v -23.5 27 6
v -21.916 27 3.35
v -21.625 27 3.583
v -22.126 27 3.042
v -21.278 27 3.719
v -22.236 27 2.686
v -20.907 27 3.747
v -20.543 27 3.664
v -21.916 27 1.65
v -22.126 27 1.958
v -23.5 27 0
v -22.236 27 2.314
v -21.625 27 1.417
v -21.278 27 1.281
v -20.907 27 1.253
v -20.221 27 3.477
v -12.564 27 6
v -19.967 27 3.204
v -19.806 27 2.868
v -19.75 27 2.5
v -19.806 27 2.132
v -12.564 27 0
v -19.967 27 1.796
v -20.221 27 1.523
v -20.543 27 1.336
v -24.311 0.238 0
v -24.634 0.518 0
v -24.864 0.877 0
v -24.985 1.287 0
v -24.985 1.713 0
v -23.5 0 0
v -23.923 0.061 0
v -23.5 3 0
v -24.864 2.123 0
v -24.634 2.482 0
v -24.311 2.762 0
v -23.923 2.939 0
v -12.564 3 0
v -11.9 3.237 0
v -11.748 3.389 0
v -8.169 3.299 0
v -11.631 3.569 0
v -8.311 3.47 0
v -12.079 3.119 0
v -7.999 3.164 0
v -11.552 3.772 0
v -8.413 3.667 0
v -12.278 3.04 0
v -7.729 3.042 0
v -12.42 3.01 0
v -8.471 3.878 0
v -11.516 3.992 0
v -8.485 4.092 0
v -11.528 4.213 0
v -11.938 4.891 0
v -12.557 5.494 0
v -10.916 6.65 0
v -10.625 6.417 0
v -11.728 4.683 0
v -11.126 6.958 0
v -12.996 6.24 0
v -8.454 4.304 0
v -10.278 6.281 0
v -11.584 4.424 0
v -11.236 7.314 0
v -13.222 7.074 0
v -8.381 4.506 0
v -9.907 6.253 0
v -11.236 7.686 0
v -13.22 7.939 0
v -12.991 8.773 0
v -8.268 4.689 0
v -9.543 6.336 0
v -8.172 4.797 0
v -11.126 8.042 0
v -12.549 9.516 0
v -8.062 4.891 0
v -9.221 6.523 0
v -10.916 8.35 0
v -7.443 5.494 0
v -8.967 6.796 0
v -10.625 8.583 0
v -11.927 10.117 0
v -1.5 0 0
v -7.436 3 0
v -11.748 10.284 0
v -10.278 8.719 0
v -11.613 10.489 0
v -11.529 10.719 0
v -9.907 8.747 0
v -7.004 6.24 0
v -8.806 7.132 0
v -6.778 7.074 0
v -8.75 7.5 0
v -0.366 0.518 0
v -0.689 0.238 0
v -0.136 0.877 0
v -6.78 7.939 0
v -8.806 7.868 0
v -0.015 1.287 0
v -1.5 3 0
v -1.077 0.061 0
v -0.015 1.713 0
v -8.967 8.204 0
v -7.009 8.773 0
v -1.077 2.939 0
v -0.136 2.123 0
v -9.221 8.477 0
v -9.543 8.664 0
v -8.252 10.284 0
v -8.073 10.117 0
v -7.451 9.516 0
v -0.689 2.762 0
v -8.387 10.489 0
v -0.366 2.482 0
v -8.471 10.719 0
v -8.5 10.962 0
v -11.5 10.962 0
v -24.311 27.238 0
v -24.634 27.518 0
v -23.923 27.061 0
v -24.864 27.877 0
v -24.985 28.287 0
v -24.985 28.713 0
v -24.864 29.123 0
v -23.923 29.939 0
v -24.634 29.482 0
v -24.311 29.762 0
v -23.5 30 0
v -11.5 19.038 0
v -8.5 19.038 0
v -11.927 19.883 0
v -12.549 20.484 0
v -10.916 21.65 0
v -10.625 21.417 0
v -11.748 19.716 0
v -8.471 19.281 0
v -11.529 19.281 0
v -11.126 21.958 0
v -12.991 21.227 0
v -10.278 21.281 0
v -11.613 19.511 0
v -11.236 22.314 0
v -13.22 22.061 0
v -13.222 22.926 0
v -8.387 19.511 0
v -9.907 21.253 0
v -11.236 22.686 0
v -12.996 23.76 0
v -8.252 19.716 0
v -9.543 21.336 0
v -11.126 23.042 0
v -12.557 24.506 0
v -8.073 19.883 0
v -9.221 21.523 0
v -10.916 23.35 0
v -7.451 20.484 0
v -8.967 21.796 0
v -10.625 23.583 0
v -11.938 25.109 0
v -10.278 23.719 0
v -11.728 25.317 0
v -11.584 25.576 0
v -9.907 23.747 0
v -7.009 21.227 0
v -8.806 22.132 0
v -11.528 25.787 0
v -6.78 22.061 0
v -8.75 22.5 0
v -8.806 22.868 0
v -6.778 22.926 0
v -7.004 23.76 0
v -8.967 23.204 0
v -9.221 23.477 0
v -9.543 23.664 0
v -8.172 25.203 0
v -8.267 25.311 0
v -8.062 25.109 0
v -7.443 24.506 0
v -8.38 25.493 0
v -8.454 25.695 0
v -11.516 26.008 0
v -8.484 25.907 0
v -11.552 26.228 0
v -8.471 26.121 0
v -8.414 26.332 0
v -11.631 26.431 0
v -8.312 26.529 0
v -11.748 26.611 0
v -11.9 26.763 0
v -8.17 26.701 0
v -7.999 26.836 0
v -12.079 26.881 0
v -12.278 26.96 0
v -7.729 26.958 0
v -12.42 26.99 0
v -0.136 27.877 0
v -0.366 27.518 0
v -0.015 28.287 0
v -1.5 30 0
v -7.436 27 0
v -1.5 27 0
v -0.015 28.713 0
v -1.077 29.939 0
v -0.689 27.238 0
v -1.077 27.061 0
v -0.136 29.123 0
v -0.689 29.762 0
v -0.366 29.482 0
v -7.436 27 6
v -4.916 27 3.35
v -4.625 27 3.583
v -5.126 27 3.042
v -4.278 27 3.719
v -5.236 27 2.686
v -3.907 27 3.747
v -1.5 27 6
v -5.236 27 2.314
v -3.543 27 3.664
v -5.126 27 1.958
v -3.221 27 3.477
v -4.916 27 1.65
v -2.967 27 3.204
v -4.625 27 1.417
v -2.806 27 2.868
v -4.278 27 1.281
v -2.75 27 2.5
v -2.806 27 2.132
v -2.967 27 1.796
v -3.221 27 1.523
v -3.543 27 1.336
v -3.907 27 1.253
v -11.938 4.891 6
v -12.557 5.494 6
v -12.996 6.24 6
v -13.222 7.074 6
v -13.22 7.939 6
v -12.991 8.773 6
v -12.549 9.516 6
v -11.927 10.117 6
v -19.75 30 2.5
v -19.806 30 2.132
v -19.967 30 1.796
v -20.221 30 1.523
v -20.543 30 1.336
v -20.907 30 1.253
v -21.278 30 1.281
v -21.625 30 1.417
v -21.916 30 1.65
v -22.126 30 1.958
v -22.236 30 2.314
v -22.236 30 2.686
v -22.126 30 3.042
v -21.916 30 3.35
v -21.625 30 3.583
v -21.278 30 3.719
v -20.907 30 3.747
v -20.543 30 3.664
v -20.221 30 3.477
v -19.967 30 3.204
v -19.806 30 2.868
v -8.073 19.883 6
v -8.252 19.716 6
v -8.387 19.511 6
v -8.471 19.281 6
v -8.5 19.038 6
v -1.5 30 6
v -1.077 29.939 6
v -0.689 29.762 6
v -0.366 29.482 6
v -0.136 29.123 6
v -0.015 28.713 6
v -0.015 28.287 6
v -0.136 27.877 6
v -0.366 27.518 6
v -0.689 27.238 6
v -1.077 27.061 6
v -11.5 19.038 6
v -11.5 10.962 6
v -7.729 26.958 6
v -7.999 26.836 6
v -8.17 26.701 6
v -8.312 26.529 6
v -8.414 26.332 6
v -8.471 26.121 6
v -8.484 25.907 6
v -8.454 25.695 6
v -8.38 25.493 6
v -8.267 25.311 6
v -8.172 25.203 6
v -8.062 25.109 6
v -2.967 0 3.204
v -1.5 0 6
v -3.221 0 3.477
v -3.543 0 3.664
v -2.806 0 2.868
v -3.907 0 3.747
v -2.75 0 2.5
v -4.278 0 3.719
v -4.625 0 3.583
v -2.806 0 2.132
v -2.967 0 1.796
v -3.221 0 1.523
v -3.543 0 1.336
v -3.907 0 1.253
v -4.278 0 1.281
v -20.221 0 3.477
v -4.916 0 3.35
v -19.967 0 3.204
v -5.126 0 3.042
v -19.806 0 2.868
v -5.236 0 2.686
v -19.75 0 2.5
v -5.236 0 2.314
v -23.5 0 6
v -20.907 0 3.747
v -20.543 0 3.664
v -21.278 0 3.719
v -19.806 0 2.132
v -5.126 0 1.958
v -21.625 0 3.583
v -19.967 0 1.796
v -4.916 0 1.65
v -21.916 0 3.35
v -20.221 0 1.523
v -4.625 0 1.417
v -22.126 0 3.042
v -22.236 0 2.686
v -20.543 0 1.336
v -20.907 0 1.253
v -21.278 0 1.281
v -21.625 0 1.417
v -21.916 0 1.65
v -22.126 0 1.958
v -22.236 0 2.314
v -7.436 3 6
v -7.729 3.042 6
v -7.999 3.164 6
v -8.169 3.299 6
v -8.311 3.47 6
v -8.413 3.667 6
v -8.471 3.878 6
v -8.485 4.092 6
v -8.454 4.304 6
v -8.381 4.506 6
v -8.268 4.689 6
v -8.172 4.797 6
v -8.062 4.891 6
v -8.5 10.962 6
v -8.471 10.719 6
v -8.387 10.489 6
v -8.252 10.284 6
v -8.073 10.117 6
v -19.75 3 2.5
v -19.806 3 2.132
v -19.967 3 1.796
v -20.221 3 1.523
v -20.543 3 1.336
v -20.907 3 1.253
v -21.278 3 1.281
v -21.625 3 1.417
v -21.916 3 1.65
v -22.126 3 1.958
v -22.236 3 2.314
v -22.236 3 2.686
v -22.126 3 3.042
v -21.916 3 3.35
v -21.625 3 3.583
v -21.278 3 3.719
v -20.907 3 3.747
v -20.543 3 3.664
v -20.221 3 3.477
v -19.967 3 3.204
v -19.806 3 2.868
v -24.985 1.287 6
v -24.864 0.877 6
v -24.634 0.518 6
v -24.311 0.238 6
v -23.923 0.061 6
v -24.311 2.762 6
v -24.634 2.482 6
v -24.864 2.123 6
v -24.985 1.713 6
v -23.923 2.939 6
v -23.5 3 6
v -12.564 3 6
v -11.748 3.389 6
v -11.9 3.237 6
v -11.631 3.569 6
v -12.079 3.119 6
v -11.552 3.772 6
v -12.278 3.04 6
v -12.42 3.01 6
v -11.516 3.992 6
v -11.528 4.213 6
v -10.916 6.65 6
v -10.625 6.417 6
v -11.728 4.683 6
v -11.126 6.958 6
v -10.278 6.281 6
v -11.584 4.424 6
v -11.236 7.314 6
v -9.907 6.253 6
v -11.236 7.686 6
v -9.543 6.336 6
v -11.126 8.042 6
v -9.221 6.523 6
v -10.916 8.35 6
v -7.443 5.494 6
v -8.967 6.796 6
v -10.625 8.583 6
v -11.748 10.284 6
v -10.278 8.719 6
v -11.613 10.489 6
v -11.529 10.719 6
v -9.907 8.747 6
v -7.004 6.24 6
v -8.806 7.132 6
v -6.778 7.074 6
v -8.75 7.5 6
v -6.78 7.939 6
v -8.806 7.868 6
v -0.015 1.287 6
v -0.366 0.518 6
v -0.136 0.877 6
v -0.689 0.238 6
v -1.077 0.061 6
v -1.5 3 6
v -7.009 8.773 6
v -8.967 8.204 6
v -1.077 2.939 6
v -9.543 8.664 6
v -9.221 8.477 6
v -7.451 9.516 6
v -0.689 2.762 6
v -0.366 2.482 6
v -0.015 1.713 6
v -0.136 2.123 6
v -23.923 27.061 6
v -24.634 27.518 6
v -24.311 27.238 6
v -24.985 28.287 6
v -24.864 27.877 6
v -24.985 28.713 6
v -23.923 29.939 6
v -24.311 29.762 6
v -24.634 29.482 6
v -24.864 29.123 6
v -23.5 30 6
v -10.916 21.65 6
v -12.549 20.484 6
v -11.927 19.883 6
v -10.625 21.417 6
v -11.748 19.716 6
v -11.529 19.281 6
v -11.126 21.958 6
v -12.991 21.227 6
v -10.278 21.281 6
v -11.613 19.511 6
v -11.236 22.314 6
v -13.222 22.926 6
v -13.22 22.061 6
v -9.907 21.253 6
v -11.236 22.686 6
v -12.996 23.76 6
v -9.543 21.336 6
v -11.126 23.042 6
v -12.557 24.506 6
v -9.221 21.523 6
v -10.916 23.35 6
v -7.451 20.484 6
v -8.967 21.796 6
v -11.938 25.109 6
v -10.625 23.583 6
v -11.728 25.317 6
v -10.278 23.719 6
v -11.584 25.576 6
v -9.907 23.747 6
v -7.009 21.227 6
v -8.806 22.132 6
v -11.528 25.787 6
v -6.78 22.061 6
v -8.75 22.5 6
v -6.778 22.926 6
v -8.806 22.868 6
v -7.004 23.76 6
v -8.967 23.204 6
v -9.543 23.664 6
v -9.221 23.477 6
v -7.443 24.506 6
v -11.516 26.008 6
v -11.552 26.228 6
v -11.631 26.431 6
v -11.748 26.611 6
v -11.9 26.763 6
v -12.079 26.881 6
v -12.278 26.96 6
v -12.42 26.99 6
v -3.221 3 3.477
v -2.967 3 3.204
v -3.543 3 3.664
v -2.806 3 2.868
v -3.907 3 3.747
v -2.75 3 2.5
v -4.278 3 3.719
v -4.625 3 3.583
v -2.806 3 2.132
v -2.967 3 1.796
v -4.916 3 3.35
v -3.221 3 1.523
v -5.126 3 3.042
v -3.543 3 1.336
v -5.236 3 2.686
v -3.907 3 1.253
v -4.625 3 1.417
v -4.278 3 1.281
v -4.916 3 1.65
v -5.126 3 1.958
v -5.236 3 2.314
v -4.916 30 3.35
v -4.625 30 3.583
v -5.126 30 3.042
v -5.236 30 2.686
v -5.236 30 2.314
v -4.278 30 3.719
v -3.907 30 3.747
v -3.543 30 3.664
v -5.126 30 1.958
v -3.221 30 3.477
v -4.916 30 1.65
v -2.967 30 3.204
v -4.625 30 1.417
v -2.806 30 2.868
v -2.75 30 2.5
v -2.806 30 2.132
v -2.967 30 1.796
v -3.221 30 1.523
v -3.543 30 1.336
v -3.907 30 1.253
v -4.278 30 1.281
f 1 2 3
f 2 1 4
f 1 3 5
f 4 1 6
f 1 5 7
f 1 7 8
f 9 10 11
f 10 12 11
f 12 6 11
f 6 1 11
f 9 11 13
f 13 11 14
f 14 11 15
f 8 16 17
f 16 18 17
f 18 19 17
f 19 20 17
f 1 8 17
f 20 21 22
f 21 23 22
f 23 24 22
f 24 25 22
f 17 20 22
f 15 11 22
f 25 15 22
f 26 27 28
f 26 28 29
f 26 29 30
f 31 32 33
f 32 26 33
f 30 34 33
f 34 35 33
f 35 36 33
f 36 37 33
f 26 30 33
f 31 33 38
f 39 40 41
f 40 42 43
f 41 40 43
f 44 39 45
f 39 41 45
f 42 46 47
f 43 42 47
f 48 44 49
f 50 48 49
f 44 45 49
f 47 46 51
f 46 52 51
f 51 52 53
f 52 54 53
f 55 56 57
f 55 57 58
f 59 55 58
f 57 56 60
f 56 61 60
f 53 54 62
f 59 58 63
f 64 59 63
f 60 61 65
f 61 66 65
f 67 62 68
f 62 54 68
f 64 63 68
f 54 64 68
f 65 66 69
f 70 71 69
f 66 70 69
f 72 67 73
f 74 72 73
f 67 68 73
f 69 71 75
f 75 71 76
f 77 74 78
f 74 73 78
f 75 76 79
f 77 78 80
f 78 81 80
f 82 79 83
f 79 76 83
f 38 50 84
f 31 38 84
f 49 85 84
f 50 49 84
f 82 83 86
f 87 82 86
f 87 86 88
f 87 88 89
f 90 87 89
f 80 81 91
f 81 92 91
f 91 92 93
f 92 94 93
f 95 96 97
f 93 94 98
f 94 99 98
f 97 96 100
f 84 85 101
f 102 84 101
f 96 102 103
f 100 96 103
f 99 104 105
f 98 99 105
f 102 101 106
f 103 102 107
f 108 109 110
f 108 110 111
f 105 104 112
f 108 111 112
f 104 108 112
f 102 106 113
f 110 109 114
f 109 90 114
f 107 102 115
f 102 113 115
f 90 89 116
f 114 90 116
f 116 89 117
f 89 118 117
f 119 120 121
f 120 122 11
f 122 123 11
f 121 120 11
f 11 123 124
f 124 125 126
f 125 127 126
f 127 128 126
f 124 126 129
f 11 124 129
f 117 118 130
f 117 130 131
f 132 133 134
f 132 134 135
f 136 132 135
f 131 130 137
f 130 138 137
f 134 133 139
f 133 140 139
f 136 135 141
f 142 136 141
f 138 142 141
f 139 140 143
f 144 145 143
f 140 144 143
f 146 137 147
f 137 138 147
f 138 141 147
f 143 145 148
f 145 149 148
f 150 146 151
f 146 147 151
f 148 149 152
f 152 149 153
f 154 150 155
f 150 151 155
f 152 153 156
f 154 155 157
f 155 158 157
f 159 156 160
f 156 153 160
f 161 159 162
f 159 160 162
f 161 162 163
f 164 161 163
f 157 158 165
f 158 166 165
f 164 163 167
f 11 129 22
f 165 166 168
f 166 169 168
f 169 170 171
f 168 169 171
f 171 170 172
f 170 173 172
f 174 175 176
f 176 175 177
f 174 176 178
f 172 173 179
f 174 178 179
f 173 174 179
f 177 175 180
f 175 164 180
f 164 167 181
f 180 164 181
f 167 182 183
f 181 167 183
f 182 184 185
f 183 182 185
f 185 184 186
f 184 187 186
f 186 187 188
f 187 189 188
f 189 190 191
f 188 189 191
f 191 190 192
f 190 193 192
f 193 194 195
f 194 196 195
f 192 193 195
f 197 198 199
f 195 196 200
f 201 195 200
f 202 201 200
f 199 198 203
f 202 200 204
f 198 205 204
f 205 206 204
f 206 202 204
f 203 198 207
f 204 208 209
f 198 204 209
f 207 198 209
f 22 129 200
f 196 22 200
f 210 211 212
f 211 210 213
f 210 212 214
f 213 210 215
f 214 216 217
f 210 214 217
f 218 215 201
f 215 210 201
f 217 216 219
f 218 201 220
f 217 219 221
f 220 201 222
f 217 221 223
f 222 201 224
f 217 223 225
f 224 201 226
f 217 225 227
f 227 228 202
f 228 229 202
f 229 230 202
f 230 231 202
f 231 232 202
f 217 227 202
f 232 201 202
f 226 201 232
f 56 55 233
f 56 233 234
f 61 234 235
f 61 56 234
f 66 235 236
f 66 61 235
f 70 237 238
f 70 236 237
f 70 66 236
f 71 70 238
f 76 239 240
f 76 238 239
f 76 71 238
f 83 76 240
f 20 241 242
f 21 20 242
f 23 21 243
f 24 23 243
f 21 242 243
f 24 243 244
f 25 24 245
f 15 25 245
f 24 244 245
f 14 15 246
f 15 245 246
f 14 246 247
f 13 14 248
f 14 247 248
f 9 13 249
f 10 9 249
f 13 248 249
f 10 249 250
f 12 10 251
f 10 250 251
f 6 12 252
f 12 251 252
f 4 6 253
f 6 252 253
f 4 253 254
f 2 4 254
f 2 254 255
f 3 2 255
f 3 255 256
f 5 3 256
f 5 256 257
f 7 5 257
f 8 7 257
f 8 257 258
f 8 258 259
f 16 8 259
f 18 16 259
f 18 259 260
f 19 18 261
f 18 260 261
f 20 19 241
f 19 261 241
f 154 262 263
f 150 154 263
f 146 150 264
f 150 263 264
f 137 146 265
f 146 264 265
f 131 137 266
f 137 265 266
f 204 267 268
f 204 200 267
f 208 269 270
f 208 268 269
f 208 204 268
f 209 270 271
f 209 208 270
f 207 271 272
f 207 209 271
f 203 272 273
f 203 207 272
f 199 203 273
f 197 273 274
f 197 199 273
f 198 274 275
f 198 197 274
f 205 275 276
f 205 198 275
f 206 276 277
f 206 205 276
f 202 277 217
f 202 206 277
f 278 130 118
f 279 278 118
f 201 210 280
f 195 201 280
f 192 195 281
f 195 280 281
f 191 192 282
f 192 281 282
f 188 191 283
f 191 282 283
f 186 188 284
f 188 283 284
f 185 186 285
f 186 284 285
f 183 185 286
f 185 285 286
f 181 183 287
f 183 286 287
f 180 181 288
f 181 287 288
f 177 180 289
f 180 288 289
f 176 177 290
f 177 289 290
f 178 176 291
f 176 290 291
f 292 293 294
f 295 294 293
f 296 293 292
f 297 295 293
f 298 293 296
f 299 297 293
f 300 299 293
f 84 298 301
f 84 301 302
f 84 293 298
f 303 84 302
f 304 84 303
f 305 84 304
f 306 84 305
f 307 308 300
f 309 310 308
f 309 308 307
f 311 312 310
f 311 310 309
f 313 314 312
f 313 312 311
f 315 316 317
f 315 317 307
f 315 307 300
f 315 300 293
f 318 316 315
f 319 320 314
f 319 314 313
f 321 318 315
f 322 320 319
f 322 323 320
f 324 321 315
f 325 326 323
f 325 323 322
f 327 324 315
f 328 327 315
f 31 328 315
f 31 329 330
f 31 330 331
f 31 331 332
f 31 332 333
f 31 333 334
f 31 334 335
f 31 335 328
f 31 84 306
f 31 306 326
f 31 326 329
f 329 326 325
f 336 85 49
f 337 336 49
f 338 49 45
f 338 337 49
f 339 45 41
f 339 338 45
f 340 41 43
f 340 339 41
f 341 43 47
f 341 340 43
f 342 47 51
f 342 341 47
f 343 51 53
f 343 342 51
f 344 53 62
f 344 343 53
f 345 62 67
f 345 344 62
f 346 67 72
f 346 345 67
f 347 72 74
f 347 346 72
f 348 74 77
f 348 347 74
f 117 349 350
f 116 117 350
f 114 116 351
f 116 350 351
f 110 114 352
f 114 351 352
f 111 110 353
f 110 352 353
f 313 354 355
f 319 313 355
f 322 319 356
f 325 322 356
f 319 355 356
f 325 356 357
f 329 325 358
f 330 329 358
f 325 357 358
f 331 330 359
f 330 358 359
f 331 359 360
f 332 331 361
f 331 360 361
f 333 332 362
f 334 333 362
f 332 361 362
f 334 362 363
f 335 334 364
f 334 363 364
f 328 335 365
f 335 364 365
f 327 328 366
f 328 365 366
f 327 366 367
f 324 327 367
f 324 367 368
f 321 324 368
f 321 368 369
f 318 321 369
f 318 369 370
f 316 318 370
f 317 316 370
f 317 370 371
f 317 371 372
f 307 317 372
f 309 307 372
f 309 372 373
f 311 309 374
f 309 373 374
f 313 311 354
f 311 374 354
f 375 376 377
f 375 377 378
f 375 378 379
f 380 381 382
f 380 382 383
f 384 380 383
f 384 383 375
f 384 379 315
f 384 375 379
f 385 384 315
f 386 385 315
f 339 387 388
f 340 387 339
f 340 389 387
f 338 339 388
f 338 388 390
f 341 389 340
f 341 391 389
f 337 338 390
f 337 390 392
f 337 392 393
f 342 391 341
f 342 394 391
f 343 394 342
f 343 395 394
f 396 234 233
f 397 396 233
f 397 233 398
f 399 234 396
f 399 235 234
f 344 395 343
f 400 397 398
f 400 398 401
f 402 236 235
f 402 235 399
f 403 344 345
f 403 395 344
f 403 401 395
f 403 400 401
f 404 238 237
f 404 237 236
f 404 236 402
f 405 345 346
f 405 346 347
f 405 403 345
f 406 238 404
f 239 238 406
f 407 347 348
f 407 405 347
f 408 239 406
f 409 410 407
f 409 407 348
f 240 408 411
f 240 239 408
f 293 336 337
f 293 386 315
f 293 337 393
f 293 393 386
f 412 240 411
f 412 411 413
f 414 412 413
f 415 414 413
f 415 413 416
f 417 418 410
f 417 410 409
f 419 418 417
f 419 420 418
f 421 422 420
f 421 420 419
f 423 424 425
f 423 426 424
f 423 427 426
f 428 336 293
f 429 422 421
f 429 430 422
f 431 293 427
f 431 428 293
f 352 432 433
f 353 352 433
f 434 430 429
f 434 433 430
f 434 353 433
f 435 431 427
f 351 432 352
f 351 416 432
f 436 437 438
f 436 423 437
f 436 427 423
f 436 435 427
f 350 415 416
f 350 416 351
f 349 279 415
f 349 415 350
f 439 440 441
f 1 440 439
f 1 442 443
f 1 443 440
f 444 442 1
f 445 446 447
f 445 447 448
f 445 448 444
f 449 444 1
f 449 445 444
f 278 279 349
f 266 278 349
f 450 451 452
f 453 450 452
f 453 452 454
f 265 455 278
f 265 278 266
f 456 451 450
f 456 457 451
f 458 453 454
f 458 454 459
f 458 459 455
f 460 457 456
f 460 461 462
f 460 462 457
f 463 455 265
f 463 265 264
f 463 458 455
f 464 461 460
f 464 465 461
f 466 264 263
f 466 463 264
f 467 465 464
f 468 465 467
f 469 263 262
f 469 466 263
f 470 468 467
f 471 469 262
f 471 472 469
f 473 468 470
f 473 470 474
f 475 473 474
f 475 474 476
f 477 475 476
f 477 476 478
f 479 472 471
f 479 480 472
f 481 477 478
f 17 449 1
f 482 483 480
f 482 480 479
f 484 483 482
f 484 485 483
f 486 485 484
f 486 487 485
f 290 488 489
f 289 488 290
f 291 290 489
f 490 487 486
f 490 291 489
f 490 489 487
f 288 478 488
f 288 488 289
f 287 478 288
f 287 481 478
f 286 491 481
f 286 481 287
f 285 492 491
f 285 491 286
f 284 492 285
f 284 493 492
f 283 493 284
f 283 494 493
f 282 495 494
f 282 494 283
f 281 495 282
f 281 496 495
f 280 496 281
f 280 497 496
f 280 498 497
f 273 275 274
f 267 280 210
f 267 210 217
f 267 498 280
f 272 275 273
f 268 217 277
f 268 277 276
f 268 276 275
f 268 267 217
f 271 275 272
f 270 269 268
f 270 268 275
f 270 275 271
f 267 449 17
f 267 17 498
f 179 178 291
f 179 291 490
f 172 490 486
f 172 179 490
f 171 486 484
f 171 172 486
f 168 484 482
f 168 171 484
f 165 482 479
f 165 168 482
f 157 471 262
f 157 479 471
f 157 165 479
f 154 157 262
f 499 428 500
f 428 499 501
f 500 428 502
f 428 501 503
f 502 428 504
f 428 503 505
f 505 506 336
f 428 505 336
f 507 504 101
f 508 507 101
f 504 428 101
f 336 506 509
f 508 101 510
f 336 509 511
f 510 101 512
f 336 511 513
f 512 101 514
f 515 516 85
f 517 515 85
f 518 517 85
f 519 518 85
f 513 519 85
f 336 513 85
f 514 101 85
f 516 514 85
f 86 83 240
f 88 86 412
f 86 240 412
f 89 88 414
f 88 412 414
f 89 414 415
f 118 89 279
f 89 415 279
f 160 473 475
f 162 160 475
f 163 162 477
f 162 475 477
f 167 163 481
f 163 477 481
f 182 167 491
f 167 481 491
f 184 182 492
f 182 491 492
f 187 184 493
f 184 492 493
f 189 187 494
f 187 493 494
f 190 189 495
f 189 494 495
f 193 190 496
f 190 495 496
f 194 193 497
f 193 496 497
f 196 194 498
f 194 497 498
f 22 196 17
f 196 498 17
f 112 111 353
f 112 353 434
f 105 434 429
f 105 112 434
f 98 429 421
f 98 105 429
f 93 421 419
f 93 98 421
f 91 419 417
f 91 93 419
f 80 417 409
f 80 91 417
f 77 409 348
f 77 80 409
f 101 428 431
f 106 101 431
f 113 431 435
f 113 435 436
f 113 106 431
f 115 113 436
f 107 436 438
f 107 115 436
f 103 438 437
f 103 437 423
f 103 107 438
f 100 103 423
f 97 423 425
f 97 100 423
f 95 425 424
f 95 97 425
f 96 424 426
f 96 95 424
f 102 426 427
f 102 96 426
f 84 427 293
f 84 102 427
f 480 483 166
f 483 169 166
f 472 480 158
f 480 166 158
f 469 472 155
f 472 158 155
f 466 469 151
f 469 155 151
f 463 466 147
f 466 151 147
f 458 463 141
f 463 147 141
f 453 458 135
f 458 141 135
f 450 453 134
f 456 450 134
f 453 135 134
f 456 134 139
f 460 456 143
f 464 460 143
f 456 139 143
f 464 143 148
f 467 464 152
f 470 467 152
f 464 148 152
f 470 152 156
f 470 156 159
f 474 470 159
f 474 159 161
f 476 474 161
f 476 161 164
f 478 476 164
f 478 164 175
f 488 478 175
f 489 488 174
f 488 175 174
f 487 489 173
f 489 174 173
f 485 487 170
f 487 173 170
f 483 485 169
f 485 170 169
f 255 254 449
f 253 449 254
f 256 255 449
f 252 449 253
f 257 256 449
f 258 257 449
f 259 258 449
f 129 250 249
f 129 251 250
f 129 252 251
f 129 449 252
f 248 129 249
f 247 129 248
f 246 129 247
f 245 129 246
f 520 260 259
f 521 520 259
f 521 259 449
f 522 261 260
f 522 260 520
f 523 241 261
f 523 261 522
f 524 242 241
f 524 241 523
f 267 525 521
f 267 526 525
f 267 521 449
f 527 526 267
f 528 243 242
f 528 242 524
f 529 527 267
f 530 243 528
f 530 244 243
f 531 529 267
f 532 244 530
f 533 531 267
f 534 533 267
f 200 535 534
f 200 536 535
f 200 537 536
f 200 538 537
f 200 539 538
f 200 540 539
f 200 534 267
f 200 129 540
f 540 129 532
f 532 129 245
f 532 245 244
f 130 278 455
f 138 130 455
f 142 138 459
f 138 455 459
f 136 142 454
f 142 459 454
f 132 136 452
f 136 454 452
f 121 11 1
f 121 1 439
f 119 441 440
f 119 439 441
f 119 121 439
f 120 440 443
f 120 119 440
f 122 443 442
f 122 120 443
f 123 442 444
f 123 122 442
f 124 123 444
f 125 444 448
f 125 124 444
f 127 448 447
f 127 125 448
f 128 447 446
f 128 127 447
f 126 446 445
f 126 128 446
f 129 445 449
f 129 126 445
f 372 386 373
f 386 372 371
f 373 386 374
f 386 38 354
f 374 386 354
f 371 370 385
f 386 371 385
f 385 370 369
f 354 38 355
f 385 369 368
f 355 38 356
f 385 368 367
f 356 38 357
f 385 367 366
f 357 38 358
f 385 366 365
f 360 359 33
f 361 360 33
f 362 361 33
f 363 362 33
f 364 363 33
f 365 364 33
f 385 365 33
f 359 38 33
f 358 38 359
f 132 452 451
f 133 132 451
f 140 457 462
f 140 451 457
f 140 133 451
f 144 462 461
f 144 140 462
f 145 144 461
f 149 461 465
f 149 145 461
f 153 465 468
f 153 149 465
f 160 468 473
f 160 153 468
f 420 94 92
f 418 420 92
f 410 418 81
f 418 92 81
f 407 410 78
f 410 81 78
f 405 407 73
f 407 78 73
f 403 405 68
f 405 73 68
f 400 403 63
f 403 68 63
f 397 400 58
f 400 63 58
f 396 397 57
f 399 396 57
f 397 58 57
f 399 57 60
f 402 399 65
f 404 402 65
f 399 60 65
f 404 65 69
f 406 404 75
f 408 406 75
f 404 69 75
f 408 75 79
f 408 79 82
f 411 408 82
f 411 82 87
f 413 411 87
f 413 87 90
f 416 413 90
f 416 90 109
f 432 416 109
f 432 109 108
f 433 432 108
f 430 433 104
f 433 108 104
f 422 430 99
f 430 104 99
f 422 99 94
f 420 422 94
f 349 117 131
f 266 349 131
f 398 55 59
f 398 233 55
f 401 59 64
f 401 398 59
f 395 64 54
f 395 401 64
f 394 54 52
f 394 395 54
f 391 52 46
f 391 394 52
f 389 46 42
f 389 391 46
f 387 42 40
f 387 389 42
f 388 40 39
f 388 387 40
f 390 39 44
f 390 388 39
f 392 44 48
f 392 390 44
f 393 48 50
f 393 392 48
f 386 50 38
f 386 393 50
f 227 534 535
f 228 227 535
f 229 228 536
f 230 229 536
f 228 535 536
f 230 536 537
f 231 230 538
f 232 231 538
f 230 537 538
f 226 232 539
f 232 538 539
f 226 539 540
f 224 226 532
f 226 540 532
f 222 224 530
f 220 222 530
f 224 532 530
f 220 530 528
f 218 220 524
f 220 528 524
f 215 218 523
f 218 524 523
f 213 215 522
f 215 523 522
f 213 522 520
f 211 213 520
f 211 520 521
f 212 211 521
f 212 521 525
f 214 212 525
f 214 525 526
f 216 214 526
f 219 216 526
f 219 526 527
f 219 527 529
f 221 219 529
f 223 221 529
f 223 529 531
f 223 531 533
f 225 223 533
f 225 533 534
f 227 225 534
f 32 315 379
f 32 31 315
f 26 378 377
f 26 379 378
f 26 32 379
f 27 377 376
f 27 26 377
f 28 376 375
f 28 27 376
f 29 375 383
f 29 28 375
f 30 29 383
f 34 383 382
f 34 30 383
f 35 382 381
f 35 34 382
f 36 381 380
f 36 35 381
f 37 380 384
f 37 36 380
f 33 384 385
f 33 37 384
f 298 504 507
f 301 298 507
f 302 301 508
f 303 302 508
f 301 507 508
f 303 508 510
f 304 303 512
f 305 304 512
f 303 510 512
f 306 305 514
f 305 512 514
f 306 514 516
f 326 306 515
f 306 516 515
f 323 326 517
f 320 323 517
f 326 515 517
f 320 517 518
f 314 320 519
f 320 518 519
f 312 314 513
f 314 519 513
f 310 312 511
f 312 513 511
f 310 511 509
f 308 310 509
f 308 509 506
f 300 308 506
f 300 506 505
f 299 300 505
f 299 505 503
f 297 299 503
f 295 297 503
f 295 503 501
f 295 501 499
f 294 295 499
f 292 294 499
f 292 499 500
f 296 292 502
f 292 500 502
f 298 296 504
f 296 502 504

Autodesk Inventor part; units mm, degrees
ref_plane "YZ Plane" through (0, 0, 0) normal (1, 0, 0) x (0, 1, 0)
ref_plane "XZ Plane" through (0, 0, 0) normal (0, 1, 0) x (-1, 0, 0)
ref_plane "XY Plane" through (0, 0, 0) normal (0, 0, 1) x (1, 0, 0)
sketch "スケッチ1" plane through (0, 0, 0) normal (0, 0, 1) x (1, 0, 0)
  line L0 (0, 0) -> (-25, 0)
  line L1 (-25, 0) -> (-25, 30)
  line L2 (-25, 30) -> (0, 30)
  line L3 (0, 30) -> (0, 0)
  circle A0 centre (-10, 22.5) radius 1.25
  circle A1 centre (-10, 7.5) radius 1.25
  line L4 (-10, 30) -> (-10, 0)
  circle A2 centre (-10, 22.5) radius 3.25
  circle A3 centre (-10, 7.5) radius 3.25
  line L5 (-23.5, 28.5) -> (-1.5, 28.5) construction
  line L6 (-23.5, 27) -> (-1.5, 27)
  line L7 (-1.5, 30) -> (-23.5, 30)
  arc A4 (-23.5, 30) -> (-23.5, 27) centre (-23.5, 28.5) ccw
  arc A5 (-1.5, 27) -> (-1.5, 30) centre (-1.5, 28.5) ccw
  line L8 (-23.5, 1.5) -> (-1.5, 1.5) construction
  line L9 (-23.5, 0) -> (-1.5, 0)
  line L10 (-1.5, 3) -> (-23.5, 3)
  arc A6 (-23.5, 3) -> (-23.5, 0) centre (-23.5, 1.5) ccw
  arc A7 (-1.5, 0) -> (-1.5, 3) centre (-1.5, 1.5) ccw
  line L11 (-10, 28.5) -> (-10, 1.5) construction
  line L12 (-11.5, 28.5) -> (-11.5, 1.5)
  line L13 (-8.5, 1.5) -> (-8.5, 28.5)
  arc A8 (-8.5, 28.5) -> (-11.5, 28.5) centre (-10, 28.5) ccw
  arc A9 (-11.5, 1.5) -> (-8.5, 1.5) centre (-10, 1.5) ccw
  point P0 (-12.5, 28.5)
  point P1 (-12.5, 1.5)
  point P2 (-10, 15)
  point P3 (-11.5, 4.6169)
  point P4 (-11.5, 3)
  point P5 (-1.5, 0)
  point P6 (-8.5, 3)
  point P7 (-8.5, 4.6169)
  point P8 (-8.5, 10.3831)
  point P9 (-8.5, 19.6169)
  point P10 (-8.5, 25.3831)
  point P11 (-8.5, 27)
  point P12 (-11.5, 27)
  point P13 (-11.5, 25.3831)
  point P14 (-11.5, 19.6169)
  point P15 (-11.5, 10.3831)
  dimension "d0" = 25
  dimension "d1" = 30
  dimension "d2" = 2.5
  dimension "d3" = 2.5
  dimension "d4" = 10
  dimension "d5" = 15
  dimension "d6" = 2
  dimension "d7" = 2
  dimension "d8" = 3
  dimension "d9" = 3
  dimension "d10" = 3
  dimension "d11" = 6
extrude "押し出し1" add sketch "スケッチ1" along normal blind 6 contours L0 A9 L13 L10 A7 | A9 L12 L10 L4 | L0 A6 L10 L12 A9 | L4 L10 L13 A9 | A5 L6 L13 A8 L2 | L10 L12 A3 L4 | L4 A3 L13 L10 | A3 L12 L4 A1 | L4 A1 A3 L13 | L13 A2 L4 L6 | L6 L4 A8 L13 | A8 L12 L6 A4 L2 | L4 L6 L12 A8 | L13 A3 | A3 L12 | L4 A2 L12 L6 | L13 A2 L4 A0 | A2 L13 | A3 L4 A2 L13 | L12 A2 L4 A3 | L4 A0 A2 L12 | A2 L12
fillet "フィレット1" radius 1.05 12 edges at (-11.5, 25.3831, 3) (-11.5, 27, 3) (-11.5, 19.6169, 3) (-8.5, 27, 3) (-8.5, 25.3831, 3) (-8.5, 19.6169, 3) (-8.5, 10.3831, 3) (-8.5, 4.6169, 3) (-11.5, 4.6169, 3) (-11.5, 10.3831, 3) (-11.5, 3, 3) (-8.5, 3, 3)
thread "ねじ1" size "M3x0.5" class "6H" standard "ANSI Metric M Profile" full length
thread "ねじ2" size "M3x0.5" class "6H" standard "ANSI Metric M Profile" full length
sketch "スケッチ2" plane through (-23.5, 30, 0) normal (0, 1, 0) x (1, 0, 0)
  line L0 (22, 0) -> (0, 0) projected
  line L1 (0, 0) -> (0, -6) projected
  line L2 (22, -6) -> (0, -6) projected
  line L3 (22, 0) -> (22, -6) projected
  circle A0 centre (2.5, -2.5) radius 2.5
  line L4 (22, 0) -> (0, 0) projected
  line L5 (0, 0) -> (0, -6) projected
  circle A1 centre (19.5, -2.5) radius 2.5
  line L6 (22, 0) -> (22, -6) projected
  circle A2 centre (2.5, -2.5) radius 1.25
  circle A3 centre (19.5, -2.5) radius 1.25
  point P0 (23.5, 0)
  dimension "d19" = 5
  dimension "d20" = 5
  dimension "d21" = 2.5
  dimension "d22" = 2.5
extrude "押し出し2" cut sketch "スケッチ2" against normal blind 30 contours A2 | A3
thread "ねじ3" size "M3x0.5" class "6H" standard "ANSI Metric M Profile" full length
thread "ねじ4" size "M3x0.5" class "6H" standard "ANSI Metric M Profile" full length
thread "ねじ5" size "M3x0.5" class "6H" standard "ANSI Metric M Profile" full length
thread "ねじ6" size "M3x0.5" class "6H" standard "ANSI Metric M Profile" full length
properties part number "ウィング土台" material "アルミニウム 7075"
